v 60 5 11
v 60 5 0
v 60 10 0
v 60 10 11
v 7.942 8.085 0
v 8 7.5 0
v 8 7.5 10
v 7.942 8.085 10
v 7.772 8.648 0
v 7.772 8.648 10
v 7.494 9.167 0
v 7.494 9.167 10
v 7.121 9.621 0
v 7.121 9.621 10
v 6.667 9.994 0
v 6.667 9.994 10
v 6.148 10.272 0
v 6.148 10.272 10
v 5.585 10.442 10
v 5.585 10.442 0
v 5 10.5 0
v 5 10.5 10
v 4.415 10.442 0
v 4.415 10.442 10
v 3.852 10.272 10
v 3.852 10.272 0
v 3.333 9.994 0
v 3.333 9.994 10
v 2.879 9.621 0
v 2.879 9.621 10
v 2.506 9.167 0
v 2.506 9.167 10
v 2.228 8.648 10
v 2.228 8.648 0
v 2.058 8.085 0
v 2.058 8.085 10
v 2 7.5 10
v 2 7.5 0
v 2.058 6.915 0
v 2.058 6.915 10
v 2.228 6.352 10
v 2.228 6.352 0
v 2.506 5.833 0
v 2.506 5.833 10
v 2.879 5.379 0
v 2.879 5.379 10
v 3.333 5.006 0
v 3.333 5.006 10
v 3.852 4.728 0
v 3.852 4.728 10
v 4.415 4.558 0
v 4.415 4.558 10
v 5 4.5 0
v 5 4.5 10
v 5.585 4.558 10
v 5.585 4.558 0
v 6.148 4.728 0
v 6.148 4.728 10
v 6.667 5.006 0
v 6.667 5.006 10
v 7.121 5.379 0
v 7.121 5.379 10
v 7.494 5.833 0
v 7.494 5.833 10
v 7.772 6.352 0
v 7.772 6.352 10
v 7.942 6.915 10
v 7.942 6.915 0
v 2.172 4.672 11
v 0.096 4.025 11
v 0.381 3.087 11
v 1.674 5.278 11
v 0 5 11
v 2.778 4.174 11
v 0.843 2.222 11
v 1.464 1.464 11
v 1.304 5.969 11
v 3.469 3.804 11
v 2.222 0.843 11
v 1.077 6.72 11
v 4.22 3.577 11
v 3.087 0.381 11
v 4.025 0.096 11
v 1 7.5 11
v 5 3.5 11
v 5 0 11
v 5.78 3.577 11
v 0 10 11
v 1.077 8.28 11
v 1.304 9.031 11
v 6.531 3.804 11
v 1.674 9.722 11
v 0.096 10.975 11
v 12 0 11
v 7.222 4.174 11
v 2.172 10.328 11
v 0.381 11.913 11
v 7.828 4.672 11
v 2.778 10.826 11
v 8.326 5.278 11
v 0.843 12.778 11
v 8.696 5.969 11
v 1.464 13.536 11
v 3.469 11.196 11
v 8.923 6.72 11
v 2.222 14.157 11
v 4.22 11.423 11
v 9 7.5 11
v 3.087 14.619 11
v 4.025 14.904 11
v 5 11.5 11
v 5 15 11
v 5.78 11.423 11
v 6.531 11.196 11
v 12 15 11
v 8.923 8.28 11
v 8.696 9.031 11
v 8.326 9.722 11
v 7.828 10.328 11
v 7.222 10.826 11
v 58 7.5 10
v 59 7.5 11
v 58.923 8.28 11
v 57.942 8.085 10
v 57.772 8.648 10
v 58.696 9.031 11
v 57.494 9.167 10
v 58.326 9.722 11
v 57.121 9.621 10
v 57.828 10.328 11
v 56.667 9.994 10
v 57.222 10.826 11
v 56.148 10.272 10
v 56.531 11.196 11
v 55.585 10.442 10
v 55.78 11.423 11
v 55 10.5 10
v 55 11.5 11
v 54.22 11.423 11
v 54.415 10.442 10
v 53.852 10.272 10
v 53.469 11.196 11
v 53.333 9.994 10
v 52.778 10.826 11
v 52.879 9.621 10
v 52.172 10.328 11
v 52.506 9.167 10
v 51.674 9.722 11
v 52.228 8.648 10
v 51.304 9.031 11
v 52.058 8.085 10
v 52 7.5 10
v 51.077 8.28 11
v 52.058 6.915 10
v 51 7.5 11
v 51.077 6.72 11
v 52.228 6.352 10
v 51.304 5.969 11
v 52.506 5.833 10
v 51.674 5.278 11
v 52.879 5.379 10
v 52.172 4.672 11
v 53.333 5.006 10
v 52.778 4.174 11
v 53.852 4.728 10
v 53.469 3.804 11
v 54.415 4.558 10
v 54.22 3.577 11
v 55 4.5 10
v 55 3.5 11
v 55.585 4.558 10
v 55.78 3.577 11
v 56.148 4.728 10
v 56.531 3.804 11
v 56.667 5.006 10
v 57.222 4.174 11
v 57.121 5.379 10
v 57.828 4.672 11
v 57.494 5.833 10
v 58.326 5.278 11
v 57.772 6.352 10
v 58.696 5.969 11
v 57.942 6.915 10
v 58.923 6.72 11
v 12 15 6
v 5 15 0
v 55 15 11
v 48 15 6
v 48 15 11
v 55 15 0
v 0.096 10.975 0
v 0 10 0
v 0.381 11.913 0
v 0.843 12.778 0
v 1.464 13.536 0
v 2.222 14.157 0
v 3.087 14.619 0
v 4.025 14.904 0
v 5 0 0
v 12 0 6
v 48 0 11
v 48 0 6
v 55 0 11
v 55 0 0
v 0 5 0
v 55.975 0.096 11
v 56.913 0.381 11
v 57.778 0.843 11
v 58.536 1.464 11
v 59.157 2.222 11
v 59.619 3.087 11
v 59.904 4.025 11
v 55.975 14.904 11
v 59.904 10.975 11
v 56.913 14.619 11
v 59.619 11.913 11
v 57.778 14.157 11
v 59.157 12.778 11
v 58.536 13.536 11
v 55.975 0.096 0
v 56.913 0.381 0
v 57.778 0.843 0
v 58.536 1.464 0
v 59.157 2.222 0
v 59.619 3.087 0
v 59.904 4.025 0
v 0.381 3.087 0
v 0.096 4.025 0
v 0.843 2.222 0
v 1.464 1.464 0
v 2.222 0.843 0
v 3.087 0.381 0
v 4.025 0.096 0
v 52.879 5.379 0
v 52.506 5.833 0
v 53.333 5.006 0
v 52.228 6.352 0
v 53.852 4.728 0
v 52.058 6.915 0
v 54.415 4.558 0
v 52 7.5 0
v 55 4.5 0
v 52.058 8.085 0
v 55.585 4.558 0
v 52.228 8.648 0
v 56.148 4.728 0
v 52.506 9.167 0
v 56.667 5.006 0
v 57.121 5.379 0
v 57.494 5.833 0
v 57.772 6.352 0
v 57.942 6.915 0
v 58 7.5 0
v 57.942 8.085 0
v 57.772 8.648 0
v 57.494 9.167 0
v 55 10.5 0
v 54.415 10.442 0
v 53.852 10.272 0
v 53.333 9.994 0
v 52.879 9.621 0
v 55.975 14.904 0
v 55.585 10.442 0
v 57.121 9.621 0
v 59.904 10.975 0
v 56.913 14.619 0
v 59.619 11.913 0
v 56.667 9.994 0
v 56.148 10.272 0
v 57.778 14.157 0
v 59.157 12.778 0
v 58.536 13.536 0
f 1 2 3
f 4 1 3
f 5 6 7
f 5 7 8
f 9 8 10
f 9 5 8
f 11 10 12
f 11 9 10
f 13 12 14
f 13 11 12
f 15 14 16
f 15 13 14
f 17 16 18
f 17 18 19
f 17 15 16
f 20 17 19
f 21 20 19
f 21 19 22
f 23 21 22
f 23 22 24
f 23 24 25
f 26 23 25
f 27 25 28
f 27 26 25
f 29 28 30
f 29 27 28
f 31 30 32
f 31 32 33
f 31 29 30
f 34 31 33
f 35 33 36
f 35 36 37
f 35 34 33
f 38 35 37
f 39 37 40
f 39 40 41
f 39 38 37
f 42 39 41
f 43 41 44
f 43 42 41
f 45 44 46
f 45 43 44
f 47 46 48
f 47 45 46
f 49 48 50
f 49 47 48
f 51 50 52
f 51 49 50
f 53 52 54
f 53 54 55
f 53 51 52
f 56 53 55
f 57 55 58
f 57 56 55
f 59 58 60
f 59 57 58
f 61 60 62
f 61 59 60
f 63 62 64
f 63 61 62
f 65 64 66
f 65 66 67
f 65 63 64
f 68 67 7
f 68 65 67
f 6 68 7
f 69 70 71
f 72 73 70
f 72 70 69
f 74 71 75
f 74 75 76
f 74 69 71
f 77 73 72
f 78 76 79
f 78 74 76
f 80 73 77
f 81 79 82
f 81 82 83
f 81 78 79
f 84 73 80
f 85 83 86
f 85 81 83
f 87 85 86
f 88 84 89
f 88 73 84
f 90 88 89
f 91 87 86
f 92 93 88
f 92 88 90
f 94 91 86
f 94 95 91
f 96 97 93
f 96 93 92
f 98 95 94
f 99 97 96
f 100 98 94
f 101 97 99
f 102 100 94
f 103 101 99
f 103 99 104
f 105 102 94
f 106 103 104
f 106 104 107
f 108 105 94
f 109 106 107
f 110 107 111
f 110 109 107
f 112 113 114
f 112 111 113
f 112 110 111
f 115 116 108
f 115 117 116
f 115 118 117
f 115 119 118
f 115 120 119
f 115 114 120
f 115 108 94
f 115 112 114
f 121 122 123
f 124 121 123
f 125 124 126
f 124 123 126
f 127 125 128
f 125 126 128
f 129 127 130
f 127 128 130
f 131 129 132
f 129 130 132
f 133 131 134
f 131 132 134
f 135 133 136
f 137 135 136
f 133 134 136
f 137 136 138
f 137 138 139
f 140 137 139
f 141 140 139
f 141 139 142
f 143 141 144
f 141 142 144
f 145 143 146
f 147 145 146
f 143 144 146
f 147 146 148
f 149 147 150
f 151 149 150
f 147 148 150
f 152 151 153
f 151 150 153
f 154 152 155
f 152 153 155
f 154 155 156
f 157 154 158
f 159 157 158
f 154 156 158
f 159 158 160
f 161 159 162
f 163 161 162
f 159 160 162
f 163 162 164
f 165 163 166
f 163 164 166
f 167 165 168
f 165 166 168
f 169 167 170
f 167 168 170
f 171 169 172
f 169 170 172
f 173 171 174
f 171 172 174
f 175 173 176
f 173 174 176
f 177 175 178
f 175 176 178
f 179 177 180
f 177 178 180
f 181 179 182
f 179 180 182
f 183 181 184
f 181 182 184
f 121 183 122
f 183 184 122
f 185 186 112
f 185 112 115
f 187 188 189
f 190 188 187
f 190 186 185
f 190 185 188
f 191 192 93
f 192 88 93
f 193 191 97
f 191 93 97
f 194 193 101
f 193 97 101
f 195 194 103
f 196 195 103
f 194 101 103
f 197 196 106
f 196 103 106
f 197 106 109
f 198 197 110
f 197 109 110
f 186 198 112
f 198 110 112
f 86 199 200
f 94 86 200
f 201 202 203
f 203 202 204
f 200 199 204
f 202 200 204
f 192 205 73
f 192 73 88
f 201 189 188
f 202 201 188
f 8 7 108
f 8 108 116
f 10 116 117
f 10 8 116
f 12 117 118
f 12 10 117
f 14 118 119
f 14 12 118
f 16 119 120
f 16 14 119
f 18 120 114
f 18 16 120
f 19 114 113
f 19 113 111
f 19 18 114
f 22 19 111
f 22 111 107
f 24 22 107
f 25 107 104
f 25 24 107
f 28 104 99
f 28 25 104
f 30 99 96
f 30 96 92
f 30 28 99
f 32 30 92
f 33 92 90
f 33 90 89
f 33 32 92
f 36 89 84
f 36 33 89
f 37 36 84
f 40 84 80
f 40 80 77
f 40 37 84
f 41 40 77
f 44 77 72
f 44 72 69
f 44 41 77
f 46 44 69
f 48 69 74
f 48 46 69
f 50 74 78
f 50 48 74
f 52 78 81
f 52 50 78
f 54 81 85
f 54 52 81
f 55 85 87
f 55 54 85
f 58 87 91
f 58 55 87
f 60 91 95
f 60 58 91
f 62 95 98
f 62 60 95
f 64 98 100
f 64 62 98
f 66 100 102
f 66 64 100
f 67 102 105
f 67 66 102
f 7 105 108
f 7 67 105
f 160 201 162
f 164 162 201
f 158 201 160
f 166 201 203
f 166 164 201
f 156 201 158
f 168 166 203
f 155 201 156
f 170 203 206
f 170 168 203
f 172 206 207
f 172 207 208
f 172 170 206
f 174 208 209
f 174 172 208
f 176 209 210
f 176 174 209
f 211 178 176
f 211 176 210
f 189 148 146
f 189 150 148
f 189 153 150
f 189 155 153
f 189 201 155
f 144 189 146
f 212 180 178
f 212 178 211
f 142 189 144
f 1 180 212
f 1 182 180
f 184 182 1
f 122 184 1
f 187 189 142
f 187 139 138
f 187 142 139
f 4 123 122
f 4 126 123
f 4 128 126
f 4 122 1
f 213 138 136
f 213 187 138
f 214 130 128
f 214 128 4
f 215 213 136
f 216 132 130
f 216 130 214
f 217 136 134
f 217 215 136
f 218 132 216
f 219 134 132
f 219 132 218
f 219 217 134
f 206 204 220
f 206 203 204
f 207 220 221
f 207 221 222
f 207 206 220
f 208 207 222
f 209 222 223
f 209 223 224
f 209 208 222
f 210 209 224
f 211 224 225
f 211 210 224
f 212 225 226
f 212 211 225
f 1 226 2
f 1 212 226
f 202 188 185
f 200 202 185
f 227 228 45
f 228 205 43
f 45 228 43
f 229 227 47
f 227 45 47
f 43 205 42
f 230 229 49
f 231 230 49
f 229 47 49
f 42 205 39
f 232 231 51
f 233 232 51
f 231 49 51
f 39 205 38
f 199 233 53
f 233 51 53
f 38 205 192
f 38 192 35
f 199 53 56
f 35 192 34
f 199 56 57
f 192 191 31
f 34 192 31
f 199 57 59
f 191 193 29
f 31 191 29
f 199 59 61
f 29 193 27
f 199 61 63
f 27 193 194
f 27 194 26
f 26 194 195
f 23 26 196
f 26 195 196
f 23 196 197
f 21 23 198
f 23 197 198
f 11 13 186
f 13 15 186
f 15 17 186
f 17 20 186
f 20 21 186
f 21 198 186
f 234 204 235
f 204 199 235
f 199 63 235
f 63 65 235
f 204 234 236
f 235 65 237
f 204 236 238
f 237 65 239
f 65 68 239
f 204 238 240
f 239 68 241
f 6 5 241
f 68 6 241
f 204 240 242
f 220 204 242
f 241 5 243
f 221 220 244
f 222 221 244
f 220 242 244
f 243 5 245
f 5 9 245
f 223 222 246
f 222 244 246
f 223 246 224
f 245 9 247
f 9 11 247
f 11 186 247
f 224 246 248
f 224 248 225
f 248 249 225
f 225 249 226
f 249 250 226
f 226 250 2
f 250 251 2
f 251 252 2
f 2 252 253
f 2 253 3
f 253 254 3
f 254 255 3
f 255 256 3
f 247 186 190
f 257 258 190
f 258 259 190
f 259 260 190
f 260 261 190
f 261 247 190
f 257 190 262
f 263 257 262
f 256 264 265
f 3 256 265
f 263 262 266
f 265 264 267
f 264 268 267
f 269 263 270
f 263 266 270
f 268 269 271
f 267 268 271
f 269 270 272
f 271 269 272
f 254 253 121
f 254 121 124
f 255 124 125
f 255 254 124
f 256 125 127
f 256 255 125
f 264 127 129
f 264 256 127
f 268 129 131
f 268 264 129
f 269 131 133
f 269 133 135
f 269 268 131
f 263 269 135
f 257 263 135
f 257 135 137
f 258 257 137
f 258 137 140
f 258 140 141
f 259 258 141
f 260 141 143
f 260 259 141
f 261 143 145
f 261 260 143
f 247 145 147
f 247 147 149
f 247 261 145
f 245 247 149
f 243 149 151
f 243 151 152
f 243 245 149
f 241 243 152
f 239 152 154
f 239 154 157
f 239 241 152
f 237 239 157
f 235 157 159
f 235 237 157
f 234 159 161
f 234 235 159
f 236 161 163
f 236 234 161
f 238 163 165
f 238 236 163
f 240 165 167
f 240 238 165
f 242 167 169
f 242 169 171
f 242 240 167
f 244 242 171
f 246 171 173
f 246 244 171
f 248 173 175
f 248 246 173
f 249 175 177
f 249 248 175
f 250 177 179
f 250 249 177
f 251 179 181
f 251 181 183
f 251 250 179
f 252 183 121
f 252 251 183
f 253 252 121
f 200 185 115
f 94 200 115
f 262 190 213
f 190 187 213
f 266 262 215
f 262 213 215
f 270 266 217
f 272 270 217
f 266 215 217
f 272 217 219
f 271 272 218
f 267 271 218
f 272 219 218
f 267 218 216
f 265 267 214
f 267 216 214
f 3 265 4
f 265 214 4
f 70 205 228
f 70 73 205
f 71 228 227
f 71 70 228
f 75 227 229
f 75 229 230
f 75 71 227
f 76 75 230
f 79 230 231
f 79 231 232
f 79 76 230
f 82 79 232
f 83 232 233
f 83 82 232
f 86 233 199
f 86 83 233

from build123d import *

# Parameters (mm, degrees)
CROQUIS1_W              = 60
CROQUIS1_H              = 15
CROQUIS1_R              = 3
SALIENTE_EXTRUIR1_DEPTH = 11
REDONDEO1_R             = 5
CORTAR_EXTRUIR1_DEPTH   = 21
CHAFL_N1_SIZE           = 1


with BuildPart() as part:
    # Croquis1 → Saliente-Extruir1 (new body)
    with BuildSketch(Plane.XY):
        with Locations((30, 7.5)):
            Rectangle(CROQUIS1_W, CROQUIS1_H)
        with Locations((5, 7.5)):
            Circle(CROQUIS1_R, mode=Mode.SUBTRACT)
        with Locations((55, 7.5)):
            Circle(CROQUIS1_R, mode=Mode.SUBTRACT)
    extrude(amount=SALIENTE_EXTRUIR1_DEPTH)

    # Redondeo1
    redondeo1_edges = [part.edges().sort_by_distance(p)[0] for p in [
        (0, 0, 5.5),
        (0, 15, 5.5),
        (60, 15, 5.5),
        (60, 0, 5.5),
    ]]
    fillet(redondeo1_edges, radius=REDONDEO1_R)

    # Croquis2 → Cortar-Extruir1 (cut)
    with BuildSketch(Plane(origin=(0, 15, 0), x_dir=(1, 0, 0), z_dir=(0, 1, 0))):
        Polygon((30, -11), (48, -11), (48, -6), (12, -6), (12, -11), align=None)
    extrude(amount=-CORTAR_EXTRUIR1_DEPTH, mode=Mode.SUBTRACT)

    # Chaflán1
    chafl_n1_edges = [part.edges().sort_by_distance(p)[0] for p in [
        (2, 7.5, 11),
        (52, 7.5, 11),
    ]]
    chamfer(chafl_n1_edges, length=CHAFL_N1_SIZE)


solid = part.part
